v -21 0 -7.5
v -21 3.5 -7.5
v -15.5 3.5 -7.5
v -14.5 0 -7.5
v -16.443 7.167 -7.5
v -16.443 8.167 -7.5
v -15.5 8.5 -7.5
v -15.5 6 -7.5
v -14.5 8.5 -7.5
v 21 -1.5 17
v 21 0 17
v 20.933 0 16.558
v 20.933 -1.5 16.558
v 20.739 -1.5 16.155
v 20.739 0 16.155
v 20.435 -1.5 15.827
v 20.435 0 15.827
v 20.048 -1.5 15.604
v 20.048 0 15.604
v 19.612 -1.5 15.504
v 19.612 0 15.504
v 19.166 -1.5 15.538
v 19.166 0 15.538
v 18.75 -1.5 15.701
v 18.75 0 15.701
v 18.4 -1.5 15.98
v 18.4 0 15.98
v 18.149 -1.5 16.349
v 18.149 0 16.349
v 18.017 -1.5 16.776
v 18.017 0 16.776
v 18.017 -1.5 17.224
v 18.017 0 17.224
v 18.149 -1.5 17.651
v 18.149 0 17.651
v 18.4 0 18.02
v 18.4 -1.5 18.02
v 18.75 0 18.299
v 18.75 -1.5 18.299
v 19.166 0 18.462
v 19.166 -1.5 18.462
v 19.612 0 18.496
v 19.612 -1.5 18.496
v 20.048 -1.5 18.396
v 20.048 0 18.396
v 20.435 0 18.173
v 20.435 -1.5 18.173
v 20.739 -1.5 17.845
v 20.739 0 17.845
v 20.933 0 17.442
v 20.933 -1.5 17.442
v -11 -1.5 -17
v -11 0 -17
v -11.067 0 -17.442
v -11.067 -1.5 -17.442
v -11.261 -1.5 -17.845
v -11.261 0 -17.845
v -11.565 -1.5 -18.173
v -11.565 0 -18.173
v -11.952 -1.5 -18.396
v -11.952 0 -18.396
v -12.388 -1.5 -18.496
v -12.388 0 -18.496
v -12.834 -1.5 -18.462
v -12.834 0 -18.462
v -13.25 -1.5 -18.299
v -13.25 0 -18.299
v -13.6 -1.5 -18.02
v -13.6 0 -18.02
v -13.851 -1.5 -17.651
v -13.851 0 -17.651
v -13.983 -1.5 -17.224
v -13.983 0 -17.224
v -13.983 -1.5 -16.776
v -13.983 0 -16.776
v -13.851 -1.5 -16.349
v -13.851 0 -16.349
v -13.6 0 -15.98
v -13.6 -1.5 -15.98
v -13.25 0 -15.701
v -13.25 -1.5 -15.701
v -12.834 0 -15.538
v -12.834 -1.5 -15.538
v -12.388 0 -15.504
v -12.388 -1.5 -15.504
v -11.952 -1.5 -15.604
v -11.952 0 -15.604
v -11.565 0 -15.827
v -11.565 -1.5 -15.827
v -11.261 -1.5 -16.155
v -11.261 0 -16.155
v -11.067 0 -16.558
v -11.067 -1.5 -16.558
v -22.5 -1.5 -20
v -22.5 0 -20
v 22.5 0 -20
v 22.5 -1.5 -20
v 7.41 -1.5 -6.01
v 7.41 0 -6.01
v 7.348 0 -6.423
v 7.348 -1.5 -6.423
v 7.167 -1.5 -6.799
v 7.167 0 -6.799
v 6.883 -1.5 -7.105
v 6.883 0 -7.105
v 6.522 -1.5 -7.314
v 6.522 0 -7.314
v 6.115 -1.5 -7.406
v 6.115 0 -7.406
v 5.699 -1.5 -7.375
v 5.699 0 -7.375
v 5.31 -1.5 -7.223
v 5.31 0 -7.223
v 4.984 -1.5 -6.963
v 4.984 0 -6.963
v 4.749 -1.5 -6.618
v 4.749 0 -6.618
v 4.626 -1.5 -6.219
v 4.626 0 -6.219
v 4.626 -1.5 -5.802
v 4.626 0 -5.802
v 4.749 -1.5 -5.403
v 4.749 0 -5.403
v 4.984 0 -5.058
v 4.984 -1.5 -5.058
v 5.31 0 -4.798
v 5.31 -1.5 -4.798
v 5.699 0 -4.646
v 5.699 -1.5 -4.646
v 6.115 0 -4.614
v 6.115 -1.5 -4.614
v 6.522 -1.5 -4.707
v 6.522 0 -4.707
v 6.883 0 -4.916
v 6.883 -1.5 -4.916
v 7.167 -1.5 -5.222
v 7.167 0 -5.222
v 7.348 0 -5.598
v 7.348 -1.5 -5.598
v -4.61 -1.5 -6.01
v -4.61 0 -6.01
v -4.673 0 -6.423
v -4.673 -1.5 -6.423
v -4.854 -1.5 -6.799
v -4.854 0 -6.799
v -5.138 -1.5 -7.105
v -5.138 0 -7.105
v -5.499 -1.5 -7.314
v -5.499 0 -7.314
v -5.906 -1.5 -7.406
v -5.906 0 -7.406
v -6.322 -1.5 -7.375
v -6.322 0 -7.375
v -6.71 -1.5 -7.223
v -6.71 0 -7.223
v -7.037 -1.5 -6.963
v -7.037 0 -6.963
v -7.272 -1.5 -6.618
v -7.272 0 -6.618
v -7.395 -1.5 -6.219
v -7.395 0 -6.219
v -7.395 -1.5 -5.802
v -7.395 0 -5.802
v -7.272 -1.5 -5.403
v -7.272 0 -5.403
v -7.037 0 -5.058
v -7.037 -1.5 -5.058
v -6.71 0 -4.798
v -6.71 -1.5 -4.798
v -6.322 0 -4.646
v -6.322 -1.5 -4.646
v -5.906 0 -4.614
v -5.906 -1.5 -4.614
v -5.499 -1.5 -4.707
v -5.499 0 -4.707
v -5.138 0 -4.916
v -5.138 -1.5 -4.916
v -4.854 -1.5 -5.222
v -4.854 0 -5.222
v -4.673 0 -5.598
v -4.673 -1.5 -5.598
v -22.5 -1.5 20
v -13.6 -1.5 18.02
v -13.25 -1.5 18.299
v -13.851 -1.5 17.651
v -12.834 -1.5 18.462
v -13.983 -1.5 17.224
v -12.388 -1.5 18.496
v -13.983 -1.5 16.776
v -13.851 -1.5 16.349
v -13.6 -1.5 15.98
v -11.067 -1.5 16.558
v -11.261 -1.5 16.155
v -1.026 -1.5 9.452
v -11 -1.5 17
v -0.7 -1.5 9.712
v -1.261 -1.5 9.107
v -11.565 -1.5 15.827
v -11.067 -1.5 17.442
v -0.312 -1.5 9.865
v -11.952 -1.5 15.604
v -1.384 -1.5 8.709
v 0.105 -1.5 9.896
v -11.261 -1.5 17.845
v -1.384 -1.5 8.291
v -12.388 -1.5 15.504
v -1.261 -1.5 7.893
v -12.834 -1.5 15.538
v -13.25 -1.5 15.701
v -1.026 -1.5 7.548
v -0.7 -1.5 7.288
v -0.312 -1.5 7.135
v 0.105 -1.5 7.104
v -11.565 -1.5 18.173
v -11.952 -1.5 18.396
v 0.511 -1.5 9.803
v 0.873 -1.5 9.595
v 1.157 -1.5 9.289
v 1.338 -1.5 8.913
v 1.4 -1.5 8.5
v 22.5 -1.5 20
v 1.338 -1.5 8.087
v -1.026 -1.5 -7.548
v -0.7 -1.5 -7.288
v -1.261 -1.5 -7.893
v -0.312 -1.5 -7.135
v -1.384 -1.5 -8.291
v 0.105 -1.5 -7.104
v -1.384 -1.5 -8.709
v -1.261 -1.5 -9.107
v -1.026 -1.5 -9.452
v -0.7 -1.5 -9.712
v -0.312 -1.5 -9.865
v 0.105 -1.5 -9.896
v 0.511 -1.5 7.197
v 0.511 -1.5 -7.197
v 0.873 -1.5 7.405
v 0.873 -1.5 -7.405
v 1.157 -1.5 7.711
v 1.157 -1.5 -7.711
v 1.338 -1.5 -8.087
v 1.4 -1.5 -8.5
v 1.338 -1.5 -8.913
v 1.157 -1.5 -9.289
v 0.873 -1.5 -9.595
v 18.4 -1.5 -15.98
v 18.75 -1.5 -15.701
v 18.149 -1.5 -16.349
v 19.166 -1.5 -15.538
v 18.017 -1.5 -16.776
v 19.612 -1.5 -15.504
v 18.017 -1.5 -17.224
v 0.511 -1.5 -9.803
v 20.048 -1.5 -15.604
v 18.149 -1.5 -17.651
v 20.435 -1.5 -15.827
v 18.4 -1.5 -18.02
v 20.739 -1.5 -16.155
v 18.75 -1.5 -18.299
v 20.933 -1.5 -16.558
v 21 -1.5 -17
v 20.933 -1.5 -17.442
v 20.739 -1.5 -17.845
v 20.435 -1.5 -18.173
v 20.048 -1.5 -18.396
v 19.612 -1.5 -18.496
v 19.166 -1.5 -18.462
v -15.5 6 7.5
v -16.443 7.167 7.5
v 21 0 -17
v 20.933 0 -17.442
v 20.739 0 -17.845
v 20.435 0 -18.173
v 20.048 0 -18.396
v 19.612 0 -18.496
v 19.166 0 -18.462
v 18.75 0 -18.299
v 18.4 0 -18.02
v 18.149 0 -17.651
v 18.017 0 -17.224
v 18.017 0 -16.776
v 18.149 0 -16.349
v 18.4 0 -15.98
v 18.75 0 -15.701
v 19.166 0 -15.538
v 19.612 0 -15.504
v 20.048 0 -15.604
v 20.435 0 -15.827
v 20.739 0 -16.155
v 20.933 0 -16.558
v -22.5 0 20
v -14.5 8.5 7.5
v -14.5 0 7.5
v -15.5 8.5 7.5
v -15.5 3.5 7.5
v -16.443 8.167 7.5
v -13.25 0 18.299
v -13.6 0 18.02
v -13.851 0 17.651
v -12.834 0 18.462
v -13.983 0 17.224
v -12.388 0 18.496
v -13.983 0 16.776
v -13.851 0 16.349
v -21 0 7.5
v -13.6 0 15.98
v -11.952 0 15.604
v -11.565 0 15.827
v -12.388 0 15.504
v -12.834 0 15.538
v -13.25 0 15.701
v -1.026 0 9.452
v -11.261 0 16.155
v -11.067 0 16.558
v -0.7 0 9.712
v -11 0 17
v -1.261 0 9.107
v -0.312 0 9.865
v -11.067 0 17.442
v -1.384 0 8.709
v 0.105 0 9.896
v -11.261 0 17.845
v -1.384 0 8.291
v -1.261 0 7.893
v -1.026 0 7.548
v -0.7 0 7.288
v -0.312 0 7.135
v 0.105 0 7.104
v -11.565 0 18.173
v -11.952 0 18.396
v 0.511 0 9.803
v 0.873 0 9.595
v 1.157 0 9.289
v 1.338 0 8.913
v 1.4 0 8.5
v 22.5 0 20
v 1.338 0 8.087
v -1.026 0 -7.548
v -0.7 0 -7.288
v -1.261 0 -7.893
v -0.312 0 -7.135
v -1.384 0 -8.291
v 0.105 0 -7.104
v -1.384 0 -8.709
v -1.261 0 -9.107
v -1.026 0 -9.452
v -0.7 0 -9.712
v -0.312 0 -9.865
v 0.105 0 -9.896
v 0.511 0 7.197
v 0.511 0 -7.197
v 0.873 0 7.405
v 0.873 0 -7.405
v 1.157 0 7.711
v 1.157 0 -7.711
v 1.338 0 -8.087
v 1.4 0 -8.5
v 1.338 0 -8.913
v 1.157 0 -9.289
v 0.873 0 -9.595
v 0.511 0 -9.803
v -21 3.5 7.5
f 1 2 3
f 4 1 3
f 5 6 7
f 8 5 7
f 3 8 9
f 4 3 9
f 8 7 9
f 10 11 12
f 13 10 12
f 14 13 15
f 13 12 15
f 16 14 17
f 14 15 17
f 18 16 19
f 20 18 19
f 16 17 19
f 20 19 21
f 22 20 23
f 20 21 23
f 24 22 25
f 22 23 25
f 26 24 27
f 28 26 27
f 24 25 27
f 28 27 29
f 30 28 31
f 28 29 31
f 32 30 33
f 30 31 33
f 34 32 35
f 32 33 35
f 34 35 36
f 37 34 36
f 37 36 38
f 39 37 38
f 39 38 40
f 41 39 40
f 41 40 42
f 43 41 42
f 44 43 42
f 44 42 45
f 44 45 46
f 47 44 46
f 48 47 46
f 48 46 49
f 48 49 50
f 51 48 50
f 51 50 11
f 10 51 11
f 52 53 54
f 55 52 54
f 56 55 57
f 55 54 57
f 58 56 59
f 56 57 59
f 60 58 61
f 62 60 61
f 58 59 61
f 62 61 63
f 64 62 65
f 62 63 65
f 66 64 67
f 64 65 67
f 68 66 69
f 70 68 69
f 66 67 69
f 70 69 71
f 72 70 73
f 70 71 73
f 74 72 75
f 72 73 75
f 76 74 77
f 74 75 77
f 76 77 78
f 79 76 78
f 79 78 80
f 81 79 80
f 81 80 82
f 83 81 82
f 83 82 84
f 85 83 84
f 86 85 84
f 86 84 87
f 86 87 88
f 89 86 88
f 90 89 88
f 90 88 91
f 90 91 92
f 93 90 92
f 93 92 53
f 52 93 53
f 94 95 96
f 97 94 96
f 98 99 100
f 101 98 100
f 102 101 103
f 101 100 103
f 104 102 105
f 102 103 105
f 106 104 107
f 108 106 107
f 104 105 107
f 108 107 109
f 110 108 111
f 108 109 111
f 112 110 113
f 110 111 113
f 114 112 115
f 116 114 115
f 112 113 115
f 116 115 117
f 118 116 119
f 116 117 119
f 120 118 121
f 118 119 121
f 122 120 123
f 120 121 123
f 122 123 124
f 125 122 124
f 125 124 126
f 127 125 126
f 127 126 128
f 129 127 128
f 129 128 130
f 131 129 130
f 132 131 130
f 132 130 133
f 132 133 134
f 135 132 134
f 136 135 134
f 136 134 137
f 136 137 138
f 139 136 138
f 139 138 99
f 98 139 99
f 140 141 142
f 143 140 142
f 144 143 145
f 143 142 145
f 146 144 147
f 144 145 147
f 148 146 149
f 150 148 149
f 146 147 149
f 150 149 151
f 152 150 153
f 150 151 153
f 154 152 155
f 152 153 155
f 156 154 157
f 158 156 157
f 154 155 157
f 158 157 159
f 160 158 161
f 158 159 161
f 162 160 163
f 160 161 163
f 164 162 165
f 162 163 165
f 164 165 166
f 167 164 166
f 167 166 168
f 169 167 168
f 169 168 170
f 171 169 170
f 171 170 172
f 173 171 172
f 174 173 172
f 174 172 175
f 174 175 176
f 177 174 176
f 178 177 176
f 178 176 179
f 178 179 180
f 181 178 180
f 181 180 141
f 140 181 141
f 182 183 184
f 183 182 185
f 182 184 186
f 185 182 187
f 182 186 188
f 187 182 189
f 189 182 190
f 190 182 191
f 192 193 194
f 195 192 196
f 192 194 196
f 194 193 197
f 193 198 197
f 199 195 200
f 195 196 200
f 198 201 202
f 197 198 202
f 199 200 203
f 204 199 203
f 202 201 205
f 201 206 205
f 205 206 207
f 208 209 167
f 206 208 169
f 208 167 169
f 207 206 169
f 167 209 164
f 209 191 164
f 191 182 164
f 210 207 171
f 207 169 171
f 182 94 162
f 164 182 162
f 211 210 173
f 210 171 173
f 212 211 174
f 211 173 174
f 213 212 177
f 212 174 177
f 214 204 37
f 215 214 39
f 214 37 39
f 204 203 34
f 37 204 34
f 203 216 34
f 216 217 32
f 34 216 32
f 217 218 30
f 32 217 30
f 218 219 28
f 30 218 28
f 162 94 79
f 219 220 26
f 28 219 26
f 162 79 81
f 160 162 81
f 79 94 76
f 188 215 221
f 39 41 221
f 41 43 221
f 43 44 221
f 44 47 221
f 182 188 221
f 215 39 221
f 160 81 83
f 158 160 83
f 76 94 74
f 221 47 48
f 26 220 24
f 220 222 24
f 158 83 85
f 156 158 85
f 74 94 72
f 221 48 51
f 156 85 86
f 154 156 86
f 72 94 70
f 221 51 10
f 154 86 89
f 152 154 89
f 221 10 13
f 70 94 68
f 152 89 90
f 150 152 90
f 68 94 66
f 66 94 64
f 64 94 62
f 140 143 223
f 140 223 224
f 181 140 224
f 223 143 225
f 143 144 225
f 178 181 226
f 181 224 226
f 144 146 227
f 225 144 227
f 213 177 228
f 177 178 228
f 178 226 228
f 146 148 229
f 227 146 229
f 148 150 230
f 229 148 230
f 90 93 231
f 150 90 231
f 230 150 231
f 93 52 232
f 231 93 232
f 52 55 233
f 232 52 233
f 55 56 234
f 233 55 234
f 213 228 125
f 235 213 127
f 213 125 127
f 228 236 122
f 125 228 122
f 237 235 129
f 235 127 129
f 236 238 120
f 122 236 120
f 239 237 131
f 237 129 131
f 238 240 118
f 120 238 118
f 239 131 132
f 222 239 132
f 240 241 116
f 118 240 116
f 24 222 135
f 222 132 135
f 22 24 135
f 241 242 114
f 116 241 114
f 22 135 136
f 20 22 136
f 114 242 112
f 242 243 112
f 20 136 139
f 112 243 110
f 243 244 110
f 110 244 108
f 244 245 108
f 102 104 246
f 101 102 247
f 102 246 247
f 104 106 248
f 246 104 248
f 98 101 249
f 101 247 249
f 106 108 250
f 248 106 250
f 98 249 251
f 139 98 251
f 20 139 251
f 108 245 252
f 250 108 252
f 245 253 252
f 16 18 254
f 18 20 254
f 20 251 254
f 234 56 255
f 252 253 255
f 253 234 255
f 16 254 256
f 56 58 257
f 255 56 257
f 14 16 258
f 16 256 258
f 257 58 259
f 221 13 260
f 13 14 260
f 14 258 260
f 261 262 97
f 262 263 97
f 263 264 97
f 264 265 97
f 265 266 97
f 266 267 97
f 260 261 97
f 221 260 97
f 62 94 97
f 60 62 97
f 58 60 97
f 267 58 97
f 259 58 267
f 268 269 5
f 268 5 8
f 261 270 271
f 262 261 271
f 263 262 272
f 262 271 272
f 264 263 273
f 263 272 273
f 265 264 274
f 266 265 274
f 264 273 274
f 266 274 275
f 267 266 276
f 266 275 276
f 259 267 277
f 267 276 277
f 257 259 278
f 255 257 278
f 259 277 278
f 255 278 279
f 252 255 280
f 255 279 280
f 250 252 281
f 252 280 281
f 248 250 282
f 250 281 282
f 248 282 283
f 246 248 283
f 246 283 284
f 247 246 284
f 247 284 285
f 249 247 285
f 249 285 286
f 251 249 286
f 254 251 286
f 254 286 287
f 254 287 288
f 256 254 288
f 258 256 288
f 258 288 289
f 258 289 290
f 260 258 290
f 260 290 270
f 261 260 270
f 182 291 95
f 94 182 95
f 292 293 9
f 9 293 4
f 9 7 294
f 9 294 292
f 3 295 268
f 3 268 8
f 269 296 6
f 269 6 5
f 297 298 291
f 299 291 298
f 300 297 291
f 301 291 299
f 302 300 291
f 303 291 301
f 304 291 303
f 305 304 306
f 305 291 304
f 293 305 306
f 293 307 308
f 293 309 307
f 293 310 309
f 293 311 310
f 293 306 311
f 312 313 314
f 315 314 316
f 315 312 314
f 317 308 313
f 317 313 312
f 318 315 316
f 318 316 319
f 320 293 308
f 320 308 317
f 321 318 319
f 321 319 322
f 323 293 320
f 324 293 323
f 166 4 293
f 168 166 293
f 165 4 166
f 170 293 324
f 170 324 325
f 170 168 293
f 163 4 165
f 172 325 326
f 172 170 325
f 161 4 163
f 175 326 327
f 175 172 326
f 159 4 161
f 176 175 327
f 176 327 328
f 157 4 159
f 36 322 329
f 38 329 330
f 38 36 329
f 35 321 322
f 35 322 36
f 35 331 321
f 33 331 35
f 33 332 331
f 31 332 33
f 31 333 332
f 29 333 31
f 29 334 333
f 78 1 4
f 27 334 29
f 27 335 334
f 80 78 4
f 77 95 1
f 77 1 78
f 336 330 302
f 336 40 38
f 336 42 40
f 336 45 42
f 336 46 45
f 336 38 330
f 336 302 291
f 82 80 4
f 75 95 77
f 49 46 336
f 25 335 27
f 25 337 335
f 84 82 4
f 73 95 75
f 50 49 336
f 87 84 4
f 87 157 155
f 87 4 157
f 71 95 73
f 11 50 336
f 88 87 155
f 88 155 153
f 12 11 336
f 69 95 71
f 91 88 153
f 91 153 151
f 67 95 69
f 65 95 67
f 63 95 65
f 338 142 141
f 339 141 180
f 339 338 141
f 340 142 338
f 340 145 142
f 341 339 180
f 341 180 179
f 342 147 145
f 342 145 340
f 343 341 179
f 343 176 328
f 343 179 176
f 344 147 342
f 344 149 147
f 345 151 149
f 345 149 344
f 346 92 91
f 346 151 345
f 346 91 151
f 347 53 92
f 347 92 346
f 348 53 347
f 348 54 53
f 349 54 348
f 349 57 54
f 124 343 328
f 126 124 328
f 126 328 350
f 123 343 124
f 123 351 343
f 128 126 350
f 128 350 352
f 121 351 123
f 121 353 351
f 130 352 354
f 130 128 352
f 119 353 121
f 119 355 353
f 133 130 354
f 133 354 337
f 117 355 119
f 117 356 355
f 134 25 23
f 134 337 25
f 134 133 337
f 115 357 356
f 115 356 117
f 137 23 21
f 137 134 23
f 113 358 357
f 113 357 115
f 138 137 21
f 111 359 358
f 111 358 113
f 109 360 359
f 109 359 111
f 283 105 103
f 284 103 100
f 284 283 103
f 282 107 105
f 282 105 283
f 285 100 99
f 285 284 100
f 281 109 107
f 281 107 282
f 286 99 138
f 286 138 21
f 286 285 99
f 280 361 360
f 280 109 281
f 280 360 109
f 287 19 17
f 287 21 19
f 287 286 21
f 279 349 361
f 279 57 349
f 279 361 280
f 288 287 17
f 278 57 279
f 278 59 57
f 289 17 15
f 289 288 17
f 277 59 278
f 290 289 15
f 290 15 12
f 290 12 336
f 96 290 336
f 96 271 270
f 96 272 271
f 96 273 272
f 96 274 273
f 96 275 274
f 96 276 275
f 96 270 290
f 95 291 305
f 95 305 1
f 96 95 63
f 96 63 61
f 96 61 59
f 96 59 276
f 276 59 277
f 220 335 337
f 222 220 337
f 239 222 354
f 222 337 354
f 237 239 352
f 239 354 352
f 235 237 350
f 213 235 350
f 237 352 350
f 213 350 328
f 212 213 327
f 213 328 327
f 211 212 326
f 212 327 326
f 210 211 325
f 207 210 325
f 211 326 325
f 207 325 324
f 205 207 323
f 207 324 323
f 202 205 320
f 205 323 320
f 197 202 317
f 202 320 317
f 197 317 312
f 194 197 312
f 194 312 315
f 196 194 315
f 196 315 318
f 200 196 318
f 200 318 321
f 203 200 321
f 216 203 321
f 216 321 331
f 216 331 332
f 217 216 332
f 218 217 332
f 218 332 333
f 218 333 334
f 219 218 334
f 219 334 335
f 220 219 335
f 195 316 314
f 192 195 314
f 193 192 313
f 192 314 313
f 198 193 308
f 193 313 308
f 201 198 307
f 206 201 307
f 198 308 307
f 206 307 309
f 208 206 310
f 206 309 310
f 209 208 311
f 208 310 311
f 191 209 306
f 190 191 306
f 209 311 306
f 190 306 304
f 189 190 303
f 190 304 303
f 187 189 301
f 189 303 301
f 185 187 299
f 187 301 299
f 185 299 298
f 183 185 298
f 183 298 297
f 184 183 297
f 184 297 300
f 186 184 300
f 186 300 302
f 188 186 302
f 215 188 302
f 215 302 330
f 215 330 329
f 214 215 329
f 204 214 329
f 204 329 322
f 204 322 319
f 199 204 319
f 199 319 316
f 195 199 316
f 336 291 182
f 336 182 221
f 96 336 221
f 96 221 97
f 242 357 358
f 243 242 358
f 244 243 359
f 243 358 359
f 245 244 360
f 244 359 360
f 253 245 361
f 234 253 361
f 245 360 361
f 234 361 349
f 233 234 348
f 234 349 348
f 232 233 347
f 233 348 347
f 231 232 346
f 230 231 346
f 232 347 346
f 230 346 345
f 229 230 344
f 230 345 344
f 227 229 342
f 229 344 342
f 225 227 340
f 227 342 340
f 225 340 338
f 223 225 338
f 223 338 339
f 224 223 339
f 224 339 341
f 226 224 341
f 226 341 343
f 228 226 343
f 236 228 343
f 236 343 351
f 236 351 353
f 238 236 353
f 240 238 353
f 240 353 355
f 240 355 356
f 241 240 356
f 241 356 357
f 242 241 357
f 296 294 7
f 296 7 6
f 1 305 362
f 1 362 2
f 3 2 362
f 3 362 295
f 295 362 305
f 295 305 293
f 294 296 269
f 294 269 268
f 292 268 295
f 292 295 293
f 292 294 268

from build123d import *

# Parameters (mm, degrees)
SKETCH2_W           = 45
SKETCH2_H           = 40
BOSS_EXTRUDE2_DEPTH = 1.5
SKETCH4_R           = 1.4
CUT_EXTRUDE1_DEPTH  = 2.5
SKETCH5_W           = 6.5
SKETCH5_H           = 15
BOSS_EXTRUDE3_DEPTH = 3.5
SKETCH6_W           = 1
SKETCH6_H           = 15
BOSS_EXTRUDE4_DEPTH = 5
BOSS_EXTRUDE5_DEPTH = 15
SKETCH9_R           = 1.5
CUT_EXTRUDE2_DEPTH  = 2.5


with BuildPart() as part:
    # Sketch2 → Boss-Extrude2 (new body)
    with BuildSketch(Plane(origin=(0, 0, 0), x_dir=(1, 0, 0), z_dir=(0, 1, 0))):
        Rectangle(SKETCH2_W, SKETCH2_H)
    extrude(amount=-BOSS_EXTRUDE2_DEPTH)

    # Sketch4 → Cut-Extrude1 (cut, through all)
    with BuildSketch(Plane(origin=(0, 0, 0), x_dir=(1, 0, 0), z_dir=(0, 1, 0))):
        with Locations((0, 8.5)):
            Circle(SKETCH4_R)
        with Locations((6.01040764, 6.01040764)):
            Circle(SKETCH4_R)
        with Locations((0, -8.5)):
            Circle(SKETCH4_R)
        with Locations((-6.01040764, 6.01040764)):
            Circle(SKETCH4_R)
    extrude(amount=-CUT_EXTRUDE1_DEPTH, mode=Mode.SUBTRACT)

    # Sketch5 → Boss-Extrude3 (add)
    with BuildSketch(Plane(origin=(0, 0, 0), x_dir=(1, 0, 0), z_dir=(0, 1, 0))):
        with Locations((-17.75, 0)):
            Rectangle(SKETCH5_W, SKETCH5_H)
    extrude(amount=BOSS_EXTRUDE3_DEPTH)

    # Sketch6 → Boss-Extrude4 (add)
    with BuildSketch(Plane(origin=(0, 3.5, 0), x_dir=(1, 0, 0), z_dir=(0, 1, 0))):
        with Locations((-15, 0)):
            Rectangle(SKETCH6_W, SKETCH6_H)
    extrude(amount=BOSS_EXTRUDE4_DEPTH)

    # Sketch7 → Boss-Extrude5 (add)
    with BuildSketch(Plane.XY.offset(7.5)):
        Polygon((-15.5, 8.5), (-16.442809042, 8.166666667), (-16.442809042, 7.166666667), (-15.5, 6), align=None)
    extrude(amount=-BOSS_EXTRUDE5_DEPTH)

    # Sketch9 → Cut-Extrude2 (cut, through all)
    with BuildSketch(Plane(origin=(0, 0, 0), x_dir=(1, 0, 0), z_dir=(0, 1, 0))):
        with Locations((-12.5, 17)):
            Circle(SKETCH9_R)
        with Locations((-12.5, -17)):
            Circle(SKETCH9_R)
        with Locations((19.5, 17)):
            Circle(SKETCH9_R)
        with Locations((19.5, -17)):
            Circle(SKETCH9_R)
    extrude(amount=-CUT_EXTRUDE2_DEPTH, mode=Mode.SUBTRACT)


solid = part.part
